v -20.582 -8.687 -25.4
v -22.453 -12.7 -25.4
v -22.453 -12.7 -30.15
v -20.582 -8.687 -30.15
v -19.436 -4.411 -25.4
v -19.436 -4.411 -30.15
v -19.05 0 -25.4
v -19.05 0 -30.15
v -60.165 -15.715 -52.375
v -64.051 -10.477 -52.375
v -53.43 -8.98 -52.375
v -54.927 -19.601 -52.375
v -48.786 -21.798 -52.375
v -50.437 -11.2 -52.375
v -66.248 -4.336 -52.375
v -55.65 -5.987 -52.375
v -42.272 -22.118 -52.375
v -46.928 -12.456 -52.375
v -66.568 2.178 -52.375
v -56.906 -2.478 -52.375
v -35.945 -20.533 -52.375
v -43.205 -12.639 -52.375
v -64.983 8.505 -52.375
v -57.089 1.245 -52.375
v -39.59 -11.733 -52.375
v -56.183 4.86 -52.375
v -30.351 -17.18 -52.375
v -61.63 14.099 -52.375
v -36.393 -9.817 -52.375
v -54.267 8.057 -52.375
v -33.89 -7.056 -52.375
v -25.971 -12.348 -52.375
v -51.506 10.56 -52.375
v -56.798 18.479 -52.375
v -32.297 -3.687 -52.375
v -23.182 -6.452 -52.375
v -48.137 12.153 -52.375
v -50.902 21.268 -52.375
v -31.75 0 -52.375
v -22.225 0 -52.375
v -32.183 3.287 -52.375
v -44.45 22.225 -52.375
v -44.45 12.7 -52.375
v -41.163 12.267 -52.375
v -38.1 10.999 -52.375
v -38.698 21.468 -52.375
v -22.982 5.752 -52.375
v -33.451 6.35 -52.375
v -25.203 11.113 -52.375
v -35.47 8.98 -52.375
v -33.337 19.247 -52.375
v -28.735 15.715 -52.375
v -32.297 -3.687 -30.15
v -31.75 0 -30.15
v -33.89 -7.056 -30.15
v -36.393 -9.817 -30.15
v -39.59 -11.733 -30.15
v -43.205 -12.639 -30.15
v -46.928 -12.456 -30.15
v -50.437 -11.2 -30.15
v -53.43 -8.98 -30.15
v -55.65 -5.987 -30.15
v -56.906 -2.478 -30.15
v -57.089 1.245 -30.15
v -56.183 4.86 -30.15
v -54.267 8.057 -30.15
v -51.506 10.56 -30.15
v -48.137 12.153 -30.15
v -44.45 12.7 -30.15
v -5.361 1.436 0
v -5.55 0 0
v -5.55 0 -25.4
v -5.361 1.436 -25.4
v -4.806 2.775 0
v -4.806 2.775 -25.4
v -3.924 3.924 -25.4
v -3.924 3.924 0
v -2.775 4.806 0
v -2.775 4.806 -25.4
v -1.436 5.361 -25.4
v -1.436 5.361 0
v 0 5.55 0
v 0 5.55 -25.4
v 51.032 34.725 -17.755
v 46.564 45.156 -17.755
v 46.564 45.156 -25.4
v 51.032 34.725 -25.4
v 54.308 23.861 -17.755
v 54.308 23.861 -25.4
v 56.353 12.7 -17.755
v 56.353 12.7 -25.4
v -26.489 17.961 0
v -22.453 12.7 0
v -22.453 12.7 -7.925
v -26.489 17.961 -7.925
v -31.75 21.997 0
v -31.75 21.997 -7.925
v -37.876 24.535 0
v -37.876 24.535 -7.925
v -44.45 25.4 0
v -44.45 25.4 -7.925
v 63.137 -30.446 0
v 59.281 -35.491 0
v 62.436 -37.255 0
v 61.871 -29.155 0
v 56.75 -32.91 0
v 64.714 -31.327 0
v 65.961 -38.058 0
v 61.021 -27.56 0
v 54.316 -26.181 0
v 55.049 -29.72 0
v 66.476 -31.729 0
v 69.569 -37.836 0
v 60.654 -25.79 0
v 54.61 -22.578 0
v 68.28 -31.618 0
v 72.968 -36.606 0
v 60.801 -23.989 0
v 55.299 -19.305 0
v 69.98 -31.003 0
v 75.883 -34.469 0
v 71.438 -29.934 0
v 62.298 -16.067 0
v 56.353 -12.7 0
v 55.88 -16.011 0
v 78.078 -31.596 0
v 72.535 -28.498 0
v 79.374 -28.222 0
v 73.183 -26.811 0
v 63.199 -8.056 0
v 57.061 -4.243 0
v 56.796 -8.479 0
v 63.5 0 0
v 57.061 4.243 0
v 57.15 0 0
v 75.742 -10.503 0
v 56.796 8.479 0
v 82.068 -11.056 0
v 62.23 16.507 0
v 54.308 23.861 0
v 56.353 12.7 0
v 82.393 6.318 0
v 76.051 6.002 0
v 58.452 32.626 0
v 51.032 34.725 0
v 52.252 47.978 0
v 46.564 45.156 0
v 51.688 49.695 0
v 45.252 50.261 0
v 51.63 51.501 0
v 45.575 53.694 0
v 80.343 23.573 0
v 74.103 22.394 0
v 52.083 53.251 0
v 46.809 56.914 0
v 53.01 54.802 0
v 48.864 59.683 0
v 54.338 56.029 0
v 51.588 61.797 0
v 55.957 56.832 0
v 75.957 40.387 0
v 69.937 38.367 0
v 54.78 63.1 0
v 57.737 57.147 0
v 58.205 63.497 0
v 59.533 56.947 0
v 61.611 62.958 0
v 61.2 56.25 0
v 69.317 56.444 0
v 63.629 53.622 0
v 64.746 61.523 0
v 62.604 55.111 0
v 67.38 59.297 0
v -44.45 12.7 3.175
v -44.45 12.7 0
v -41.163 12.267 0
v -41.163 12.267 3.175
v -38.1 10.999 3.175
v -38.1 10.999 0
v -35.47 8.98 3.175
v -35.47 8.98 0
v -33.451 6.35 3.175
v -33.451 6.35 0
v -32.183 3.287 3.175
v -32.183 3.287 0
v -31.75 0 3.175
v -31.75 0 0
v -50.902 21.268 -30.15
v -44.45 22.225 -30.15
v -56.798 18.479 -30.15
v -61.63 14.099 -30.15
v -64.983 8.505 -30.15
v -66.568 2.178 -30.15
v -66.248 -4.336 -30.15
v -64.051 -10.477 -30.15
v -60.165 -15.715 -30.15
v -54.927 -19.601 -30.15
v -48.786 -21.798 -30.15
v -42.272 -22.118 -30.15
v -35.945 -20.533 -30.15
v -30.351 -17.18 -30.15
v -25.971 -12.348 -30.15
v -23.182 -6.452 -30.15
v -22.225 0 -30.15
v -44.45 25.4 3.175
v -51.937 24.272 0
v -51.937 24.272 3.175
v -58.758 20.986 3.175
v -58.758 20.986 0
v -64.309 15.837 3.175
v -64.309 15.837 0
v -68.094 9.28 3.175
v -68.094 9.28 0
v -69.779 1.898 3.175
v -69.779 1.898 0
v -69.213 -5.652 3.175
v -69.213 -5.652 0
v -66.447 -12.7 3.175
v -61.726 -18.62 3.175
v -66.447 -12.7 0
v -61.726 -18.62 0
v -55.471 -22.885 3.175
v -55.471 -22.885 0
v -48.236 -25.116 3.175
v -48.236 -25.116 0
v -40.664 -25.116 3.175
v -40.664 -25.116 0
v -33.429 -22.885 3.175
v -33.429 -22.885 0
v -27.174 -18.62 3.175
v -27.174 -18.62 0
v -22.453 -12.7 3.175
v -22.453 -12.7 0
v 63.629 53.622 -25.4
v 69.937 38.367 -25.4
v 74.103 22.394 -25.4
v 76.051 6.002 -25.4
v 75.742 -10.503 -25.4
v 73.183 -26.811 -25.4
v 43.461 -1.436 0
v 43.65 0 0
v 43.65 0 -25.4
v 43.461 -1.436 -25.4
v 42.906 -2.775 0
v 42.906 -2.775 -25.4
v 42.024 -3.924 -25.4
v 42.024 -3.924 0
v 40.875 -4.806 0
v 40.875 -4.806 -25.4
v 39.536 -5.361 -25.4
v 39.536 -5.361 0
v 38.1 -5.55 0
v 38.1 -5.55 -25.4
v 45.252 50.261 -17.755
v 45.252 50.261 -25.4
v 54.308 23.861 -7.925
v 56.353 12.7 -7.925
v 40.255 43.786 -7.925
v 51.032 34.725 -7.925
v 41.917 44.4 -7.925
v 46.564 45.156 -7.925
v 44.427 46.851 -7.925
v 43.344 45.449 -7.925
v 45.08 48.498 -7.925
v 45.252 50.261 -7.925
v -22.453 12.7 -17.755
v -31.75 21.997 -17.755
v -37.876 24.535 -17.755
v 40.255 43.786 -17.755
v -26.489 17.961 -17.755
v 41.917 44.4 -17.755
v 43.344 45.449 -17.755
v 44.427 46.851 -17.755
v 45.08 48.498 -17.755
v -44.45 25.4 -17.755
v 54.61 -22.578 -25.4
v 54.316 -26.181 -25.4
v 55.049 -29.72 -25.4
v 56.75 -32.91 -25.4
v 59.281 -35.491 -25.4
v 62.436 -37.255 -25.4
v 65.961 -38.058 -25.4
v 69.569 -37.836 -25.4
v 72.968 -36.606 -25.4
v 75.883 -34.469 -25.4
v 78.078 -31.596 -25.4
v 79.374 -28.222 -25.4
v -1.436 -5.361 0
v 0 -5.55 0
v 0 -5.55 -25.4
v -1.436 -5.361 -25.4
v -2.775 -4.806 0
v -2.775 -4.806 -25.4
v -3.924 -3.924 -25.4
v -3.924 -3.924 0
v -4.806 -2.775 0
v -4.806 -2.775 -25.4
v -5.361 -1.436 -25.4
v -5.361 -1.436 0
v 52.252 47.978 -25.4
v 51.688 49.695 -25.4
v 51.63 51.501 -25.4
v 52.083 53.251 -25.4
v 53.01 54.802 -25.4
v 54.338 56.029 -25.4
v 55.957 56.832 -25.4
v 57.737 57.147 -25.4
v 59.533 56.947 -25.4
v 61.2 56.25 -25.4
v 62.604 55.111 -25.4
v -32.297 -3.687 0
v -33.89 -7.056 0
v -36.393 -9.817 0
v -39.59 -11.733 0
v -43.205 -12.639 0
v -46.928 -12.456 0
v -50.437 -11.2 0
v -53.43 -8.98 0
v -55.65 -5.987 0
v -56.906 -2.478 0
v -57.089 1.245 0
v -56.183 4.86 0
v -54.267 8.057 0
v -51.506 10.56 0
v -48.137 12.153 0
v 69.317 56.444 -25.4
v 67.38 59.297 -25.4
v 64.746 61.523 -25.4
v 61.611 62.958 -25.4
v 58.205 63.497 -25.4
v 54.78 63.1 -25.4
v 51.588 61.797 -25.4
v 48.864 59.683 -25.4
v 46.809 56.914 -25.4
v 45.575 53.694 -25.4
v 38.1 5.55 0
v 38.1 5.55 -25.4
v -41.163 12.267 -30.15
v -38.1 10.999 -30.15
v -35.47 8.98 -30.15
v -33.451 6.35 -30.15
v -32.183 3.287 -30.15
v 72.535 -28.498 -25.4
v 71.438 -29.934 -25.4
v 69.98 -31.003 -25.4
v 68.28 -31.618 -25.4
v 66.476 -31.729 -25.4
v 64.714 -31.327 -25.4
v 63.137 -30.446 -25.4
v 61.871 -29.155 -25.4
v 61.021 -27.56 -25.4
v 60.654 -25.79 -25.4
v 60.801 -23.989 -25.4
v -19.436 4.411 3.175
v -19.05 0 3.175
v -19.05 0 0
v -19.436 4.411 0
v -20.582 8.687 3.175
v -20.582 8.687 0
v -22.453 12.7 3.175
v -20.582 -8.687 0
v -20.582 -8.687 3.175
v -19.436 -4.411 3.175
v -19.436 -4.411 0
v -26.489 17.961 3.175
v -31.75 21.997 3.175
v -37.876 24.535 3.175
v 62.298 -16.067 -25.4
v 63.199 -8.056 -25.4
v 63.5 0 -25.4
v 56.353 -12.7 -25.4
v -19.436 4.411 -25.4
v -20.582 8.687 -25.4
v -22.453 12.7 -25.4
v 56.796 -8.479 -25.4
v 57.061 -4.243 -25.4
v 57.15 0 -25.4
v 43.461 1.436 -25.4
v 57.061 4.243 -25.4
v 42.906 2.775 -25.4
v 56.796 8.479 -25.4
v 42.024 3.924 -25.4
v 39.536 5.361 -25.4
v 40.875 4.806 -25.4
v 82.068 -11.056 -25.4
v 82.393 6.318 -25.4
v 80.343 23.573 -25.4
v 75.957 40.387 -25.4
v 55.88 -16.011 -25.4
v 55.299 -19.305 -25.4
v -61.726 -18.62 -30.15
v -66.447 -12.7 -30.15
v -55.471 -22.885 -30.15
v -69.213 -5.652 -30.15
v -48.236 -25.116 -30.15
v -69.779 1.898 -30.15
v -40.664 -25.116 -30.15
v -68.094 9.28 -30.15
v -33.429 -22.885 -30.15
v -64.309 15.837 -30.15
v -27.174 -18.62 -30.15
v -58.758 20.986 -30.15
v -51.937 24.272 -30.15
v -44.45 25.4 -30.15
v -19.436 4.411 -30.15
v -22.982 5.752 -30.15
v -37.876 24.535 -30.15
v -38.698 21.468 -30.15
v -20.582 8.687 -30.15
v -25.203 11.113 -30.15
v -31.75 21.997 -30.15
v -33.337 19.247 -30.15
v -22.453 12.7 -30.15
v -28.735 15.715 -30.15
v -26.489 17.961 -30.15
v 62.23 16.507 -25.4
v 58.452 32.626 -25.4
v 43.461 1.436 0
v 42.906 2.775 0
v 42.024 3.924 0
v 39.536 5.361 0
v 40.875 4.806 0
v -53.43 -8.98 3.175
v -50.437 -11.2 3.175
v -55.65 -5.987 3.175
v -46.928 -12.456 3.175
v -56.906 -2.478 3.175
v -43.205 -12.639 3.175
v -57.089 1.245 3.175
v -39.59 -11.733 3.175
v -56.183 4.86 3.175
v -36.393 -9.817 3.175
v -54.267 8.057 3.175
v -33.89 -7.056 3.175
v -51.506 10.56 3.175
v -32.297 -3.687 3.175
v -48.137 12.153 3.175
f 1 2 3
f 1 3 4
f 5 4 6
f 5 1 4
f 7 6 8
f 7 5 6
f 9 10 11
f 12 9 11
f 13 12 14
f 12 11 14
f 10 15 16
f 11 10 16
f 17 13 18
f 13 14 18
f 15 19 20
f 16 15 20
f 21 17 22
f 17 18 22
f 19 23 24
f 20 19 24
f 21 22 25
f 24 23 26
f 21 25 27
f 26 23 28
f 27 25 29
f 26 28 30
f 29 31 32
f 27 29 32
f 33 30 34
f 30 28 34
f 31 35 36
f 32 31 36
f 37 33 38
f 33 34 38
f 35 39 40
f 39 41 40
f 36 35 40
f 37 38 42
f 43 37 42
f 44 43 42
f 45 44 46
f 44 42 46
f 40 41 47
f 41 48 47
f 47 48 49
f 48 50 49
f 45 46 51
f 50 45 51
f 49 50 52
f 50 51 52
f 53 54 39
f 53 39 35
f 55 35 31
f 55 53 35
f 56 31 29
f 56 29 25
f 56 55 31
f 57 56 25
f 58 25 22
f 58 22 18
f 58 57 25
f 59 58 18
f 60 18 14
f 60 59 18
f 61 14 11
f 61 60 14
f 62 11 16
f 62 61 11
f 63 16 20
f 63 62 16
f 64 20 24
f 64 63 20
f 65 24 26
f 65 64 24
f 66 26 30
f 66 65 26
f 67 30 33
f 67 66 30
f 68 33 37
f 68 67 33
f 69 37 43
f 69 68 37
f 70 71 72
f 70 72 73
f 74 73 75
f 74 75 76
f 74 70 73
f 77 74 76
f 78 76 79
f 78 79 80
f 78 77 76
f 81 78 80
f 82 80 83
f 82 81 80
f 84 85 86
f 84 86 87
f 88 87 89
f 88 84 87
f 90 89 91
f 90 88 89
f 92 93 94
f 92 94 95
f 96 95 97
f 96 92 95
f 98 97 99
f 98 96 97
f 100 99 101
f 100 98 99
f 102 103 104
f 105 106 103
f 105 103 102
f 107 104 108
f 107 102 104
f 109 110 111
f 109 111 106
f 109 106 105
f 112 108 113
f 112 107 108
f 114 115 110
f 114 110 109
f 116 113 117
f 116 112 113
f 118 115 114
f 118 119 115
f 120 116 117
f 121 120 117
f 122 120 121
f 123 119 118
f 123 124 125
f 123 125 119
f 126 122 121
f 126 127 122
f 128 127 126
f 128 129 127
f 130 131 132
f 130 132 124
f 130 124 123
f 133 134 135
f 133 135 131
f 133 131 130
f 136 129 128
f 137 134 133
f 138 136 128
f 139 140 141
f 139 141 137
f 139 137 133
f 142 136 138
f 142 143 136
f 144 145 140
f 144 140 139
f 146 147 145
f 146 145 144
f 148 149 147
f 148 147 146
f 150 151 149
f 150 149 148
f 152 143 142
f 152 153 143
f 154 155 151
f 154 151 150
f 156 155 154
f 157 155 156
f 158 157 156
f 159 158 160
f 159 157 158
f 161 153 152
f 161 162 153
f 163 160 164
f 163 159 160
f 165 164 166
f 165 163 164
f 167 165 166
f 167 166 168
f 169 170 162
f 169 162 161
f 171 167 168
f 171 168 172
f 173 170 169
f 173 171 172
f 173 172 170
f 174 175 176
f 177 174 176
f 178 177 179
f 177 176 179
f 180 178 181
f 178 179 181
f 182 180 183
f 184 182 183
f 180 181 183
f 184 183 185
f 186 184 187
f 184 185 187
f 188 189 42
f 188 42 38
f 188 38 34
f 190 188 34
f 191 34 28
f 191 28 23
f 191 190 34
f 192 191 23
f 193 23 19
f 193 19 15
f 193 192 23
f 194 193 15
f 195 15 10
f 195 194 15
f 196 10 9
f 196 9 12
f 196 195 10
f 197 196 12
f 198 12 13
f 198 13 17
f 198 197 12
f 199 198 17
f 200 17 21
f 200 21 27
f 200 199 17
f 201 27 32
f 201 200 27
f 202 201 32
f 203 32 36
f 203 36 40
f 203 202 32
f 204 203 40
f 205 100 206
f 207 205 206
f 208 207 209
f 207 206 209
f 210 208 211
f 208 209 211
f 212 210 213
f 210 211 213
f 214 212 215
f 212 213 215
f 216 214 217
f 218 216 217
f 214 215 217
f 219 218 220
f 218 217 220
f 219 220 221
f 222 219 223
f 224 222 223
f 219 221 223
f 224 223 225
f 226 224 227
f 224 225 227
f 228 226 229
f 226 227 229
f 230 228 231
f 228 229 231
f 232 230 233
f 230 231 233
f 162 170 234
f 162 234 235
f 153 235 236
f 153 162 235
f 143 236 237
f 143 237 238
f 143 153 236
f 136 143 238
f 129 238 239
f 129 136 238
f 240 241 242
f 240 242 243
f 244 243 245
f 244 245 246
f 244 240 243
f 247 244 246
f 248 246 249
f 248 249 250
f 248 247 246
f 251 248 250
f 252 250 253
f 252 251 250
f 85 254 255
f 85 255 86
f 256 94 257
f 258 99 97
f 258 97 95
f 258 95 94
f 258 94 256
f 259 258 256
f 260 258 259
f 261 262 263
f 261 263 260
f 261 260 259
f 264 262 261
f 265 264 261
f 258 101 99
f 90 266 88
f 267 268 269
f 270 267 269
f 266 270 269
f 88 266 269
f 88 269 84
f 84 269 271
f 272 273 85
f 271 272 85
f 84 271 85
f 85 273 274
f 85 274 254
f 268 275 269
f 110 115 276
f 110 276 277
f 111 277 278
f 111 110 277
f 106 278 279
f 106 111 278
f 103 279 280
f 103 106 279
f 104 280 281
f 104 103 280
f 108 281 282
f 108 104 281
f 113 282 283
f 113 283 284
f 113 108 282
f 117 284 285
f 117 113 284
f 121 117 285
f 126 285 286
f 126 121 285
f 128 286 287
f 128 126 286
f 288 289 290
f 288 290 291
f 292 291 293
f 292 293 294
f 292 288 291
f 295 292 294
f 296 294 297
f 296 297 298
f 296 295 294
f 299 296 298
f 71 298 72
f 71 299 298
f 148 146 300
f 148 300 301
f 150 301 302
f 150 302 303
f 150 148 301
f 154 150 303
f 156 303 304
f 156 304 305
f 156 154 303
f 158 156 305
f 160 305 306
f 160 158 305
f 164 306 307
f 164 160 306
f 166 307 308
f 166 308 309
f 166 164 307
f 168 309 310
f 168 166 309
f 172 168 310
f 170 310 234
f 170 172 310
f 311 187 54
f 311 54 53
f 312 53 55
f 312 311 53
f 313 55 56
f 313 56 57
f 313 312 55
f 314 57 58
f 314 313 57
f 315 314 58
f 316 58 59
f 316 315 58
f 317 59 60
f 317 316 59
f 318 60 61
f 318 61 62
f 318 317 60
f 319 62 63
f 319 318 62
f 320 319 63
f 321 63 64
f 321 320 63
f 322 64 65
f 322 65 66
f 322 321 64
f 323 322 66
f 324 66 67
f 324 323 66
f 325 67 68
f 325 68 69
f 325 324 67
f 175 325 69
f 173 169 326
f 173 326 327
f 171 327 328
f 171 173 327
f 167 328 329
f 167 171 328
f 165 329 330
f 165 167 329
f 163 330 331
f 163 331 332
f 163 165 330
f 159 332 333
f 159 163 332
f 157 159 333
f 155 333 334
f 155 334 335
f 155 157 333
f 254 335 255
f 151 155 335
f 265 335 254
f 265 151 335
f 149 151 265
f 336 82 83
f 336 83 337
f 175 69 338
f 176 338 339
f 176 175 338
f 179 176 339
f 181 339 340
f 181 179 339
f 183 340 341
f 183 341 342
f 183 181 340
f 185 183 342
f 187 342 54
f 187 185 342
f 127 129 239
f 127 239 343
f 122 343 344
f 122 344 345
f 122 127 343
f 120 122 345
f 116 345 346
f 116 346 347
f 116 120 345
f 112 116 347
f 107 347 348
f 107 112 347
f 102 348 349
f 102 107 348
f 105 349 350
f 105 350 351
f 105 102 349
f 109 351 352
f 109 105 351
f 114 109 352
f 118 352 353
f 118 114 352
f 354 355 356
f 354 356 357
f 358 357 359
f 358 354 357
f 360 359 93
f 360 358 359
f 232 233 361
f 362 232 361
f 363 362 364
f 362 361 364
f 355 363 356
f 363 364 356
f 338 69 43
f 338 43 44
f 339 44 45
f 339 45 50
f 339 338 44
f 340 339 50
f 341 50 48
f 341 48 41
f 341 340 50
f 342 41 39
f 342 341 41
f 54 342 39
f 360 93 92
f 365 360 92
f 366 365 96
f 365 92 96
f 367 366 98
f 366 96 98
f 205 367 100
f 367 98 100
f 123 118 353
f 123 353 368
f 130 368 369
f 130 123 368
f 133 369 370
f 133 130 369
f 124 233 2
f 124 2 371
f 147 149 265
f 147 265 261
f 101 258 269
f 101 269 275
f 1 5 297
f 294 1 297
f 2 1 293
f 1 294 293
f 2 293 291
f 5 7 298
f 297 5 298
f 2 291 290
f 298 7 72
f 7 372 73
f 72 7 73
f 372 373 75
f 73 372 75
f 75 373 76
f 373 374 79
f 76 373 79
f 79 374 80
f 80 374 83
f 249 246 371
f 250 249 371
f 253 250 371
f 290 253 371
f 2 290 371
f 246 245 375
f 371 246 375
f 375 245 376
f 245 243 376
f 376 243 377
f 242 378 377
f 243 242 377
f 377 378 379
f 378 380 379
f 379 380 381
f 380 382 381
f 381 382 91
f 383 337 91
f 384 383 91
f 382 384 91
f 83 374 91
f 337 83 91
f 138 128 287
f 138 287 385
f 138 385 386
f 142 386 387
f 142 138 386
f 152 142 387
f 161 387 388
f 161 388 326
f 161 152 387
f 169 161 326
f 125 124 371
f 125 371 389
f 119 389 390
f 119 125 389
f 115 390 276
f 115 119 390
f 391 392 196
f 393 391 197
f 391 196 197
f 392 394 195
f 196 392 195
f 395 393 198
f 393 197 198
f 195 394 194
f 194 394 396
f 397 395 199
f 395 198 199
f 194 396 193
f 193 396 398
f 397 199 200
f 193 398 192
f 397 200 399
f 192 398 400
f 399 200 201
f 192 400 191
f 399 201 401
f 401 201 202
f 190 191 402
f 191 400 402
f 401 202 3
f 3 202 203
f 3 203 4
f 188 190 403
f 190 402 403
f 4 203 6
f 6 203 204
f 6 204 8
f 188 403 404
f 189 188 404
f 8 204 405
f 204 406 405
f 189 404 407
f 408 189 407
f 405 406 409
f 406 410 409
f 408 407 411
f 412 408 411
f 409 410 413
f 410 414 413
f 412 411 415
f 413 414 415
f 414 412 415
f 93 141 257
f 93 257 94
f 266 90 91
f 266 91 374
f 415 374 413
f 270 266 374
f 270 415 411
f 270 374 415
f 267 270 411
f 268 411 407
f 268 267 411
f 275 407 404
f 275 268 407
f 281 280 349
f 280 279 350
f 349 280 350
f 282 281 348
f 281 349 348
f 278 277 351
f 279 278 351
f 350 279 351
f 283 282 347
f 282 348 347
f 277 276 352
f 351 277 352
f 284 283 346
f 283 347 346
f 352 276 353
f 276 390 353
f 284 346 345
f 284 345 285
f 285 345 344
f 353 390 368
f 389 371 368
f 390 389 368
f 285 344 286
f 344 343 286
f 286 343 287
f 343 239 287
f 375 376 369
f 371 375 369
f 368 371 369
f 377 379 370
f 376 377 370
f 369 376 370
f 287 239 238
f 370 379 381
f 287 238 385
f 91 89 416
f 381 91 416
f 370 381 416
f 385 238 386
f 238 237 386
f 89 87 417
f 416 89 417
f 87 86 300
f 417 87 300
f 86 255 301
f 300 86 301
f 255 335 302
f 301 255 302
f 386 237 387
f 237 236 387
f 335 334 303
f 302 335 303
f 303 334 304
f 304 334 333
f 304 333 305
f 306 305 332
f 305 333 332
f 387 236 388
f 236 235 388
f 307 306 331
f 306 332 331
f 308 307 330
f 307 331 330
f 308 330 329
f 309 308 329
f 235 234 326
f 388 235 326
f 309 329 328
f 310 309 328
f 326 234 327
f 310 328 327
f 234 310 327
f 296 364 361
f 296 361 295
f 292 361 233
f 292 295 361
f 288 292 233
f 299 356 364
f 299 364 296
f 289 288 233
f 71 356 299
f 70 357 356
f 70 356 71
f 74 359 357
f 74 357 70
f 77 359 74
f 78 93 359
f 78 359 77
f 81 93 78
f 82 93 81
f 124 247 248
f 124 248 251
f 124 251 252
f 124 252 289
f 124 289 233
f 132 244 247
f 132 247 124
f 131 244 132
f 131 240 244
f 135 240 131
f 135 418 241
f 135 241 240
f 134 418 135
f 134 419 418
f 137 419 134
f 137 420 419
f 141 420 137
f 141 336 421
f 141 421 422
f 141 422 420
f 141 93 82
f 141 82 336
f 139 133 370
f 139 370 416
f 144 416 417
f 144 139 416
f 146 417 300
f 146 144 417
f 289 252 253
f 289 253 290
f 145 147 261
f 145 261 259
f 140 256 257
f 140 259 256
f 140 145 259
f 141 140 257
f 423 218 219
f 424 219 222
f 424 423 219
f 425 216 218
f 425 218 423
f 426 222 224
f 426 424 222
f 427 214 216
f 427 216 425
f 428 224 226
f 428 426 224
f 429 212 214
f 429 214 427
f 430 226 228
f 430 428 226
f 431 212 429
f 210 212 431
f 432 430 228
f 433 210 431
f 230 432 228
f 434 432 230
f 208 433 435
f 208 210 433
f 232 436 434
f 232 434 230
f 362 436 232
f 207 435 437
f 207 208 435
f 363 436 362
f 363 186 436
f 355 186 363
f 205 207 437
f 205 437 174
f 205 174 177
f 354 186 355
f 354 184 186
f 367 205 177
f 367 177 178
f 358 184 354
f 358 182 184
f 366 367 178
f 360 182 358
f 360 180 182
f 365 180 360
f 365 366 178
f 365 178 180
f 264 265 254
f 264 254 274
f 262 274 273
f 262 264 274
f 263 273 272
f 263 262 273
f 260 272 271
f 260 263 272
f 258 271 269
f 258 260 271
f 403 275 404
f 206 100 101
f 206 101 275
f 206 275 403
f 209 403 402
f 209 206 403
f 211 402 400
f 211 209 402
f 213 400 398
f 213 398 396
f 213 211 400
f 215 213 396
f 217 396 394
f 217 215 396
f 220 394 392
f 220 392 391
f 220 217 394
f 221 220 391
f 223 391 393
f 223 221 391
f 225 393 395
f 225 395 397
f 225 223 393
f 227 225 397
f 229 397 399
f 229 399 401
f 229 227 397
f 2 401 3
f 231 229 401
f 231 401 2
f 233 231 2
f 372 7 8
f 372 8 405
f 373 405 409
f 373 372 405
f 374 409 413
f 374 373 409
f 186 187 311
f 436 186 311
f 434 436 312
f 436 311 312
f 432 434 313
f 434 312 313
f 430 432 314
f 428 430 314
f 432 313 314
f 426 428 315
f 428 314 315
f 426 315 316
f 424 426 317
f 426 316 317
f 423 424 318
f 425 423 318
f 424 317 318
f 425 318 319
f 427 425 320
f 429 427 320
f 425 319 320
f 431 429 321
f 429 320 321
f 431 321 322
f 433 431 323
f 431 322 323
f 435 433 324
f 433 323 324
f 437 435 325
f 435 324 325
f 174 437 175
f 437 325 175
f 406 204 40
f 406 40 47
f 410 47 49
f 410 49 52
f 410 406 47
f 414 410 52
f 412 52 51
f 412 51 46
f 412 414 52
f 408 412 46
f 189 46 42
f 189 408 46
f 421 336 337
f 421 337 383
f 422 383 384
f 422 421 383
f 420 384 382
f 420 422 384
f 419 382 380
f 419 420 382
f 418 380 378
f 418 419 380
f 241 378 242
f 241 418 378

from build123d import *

# Parameters (mm, degrees)
F1_DEPTH      = 3.175
F1_DEPTH_BACK = 30.1498
F2_DEPTH      = 25.4
F3_DEPTH      = 25.4
F4_START      = -7.9248
F4_DEPTH      = 9.8298
F5_DEPTH      = 52.3748


with BuildPart() as f1:
    # F0 (on Top) → F1 (new body, two sides)
    with BuildSketch(Plane.XY) as f1_sk:
        with BuildLine():
            Line((-22.225, 0), (-19.05, 0))
            ThreePointArc((-19.05, 0), (-19.9154840123, 6.5740037456), (-22.4529547439, 12.7))
            ThreePointArc((-22.4529547439, 12.7), (-31.75, 21.9970452561), (-44.45, 25.4))
            Line((-44.45, 25.4), (-44.45, 22.225))
            ThreePointArc((-44.45, 22.225), (-28.7345517881, 15.7154482119), (-22.225, 0))
        make_face()
        with BuildLine():
            ThreePointArc((-22.4529547439, -12.7), (-19.9154840123, -6.5740037456), (-19.05, 0))
            Line((-19.05, 0), (-22.225, 0))
            ThreePointArc((-22.225, 0), (-60.1654482119, -15.7154482119), (-44.45, 22.225))
            Line((-44.45, 22.225), (-44.45, 25.4))
            ThreePointArc((-44.45, 25.4), (-66.4470452561, -12.7), (-22.4529547439, -12.7))
        make_face()
        with BuildLine():
            ThreePointArc((-44.45, 22.225), (-60.1654482119, -15.7154482119), (-22.225, 0))
            Line((-22.225, 0), (-31.75, 0))
            ThreePointArc((-31.75, 0), (-53.4302561211, -8.9802561211), (-44.45, 12.7))
            Line((-44.45, 12.7), (-44.45, 22.225))
        make_face()
        with BuildLine():
            Line((-31.75, 0), (-22.225, 0))
            ThreePointArc((-22.225, 0), (-28.7345517881, 15.7154482119), (-44.45, 22.225))
            Line((-44.45, 22.225), (-44.45, 12.7))
            ThreePointArc((-44.45, 12.7), (-35.4697438789, 8.9802561211), (-31.75, 0))
        make_face()
    extrude(amount=F1_DEPTH)
    extrude(f1_sk.sketch, amount=-F1_DEPTH_BACK)



with BuildPart() as f2:
    # F0 (on Top) → F2 (new body)
    with BuildSketch(Plane.XY):
        with BuildLine():
            ThreePointArc((46.5639319141, 45.1555555556), (52.8217153018, 29.3389400327), (56.3531249516, 12.7))
            ThreePointArc((56.3531249516, 12.7), (56.9505855384, 6.3624879144), (57.15, 0))
            ThreePointArc((57.15, 0), (56.9505855384, -6.3624879144), (56.3531249516, -12.7))
            ThreePointArc((56.3531249516, -12.7), (55.6033339134, -17.6604182514), (54.6095979732, -22.5777777778))
            ThreePointArc((54.6095979732, -22.5777777778), (64.1698254977, -37.7824497467), (79.3744974665, -28.2222222222))
            ThreePointArc((79.3744974665, -28.2222222222), (81.6634026015, 14.9803098855), (69.3174148927, 56.4444444444))
            ThreePointArc((69.3174148927, 56.4444444444), (54.7801695925, 63.1004559127), (45.25211394, 50.2610577545))
            Line((45.25211394, 50.2610577545), (46.5639319141, 45.1555555556))
        make_face()
        with BuildLine():
            ThreePointArc((60.8008228466, -23.9888888889), (62.823083358, -12.0701320149), (63.5, 0))
            ThreePointArc((63.5, 0), (60.6504663929, 24.6392870025), (52.2523026588, 47.9777777778))
            ThreePointArc((52.2523026588, 47.9777777778), (55.1184511812, 56.4883707446), (63.629044148, 53.6222222222))
            ThreePointArc((63.629044148, 53.6222222222), (75.3577324715, 14.2312943912), (73.1832725932, -26.8111111111))
            ThreePointArc((73.1832725932, -26.8111111111), (65.5809366088, -31.5912248733), (60.8008228466, -23.9888888889))
        make_face(mode=Mode.SUBTRACT)
    extrude(amount=-F2_DEPTH)


with BuildPart() as f1_1:
    add(f1.part)

    add(f2.part)  # F3 merges F2
    # F0 (on Top) → F3 (join)
    with BuildSketch(Plane.XY):
        with BuildLine():
            Line((-5.5499, 0), (-19.05, 0))
            ThreePointArc((-19.05, 0), (-19.9154840123, -6.5740037456), (-22.4529547439, -12.7))
            Line((-22.4529547439, -12.7), (0, -12.7))
            Line((0, -12.7), (0, -5.5499))
            ThreePointArc((0, -5.5499), (-3.9243719249, -3.9243719249), (-5.5499, 0))
        make_face()
        with BuildLine():
            ThreePointArc((-22.4529547439, 12.7), (-19.9154840123, 6.5740037456), (-19.05, 0))
            Line((-19.05, 0), (-5.5499, 0))
            ThreePointArc((-5.5499, 0), (-3.9243719249, 3.9243719249), (0, 5.5499))
            Line((0, 5.5499), (0, 12.7))
            Line((0, 12.7), (-22.4529547439, 12.7))
        make_face()
        with BuildLine():
            Line((0, 12.7), (0, 5.5499))
            Line((0, 5.5499), (38.1, 5.5499))
            ThreePointArc((38.1, 5.5499), (42.0243719249, 3.9243719249), (43.6499, 0))
            Line((43.6499, 0), (57.15, 0))
            ThreePointArc((57.15, 0), (56.9505855384, 6.3624879144), (56.3531249516, 12.7))
            Line((56.3531249516, 12.7), (0, 12.7))
        make_face()
        with BuildLine():
            Line((38.1, -5.5499), (0, -5.5499))
            Line((0, -5.5499), (0, -12.7))
            Line((0, -12.7), (56.3531249516, -12.7))
            ThreePointArc((56.3531249516, -12.7), (56.9505855384, -6.3624879144), (57.15, 0))
            Line((57.15, 0), (43.6499, 0))
            ThreePointArc((43.6499, 0), (42.0243719249, -3.9243719249), (38.1, -5.5499))
        make_face()
    extrude(amount=-F3_DEPTH)

    # F0 (on Top) → F4 (join)
    with BuildSketch(Plane.XY.offset(F4_START)):
        with BuildLine():
            ThreePointArc((-44.45, 25.4), (-31.75, 21.9970452561), (-22.4529547439, 12.7))
            Line((-22.4529547439, 12.7), (0, 12.7))
            Line((0, 12.7), (56.3531249516, 12.7))
            ThreePointArc((56.3531249516, 12.7), (52.8217153018, 29.3389400327), (46.5639319141, 45.1555555556))
            Line((46.5639319141, 45.1555555556), (45.25211394, 50.2610577545))
            ThreePointArc((45.25211394, 50.2610577545), (43.9347743486, 46.1118478743), (40.2548039053, 43.7860912739))
            Line((40.2548039053, 43.7860912739), (-44.45, 25.4))
        make_face()
    extrude(amount=-F4_DEPTH)

    # F0 (on Top) → F5 (join)
    with BuildSketch(Plane.XY):
        with BuildLine():
            ThreePointArc((-44.45, 22.225), (-60.1654482119, -15.7154482119), (-22.225, 0))
            Line((-22.225, 0), (-31.75, 0))
            ThreePointArc((-31.75, 0), (-53.4302561211, -8.9802561211), (-44.45, 12.7))
            Line((-44.45, 12.7), (-44.45, 22.225))
        make_face()
        with BuildLine():
            Line((-31.75, 0), (-22.225, 0))
            ThreePointArc((-22.225, 0), (-28.7345517881, 15.7154482119), (-44.45, 22.225))
            Line((-44.45, 22.225), (-44.45, 12.7))
            ThreePointArc((-44.45, 12.7), (-35.4697438789, 8.9802561211), (-31.75, 0))
        make_face()
    extrude(amount=-F5_DEPTH)


solid = f1_1.part
